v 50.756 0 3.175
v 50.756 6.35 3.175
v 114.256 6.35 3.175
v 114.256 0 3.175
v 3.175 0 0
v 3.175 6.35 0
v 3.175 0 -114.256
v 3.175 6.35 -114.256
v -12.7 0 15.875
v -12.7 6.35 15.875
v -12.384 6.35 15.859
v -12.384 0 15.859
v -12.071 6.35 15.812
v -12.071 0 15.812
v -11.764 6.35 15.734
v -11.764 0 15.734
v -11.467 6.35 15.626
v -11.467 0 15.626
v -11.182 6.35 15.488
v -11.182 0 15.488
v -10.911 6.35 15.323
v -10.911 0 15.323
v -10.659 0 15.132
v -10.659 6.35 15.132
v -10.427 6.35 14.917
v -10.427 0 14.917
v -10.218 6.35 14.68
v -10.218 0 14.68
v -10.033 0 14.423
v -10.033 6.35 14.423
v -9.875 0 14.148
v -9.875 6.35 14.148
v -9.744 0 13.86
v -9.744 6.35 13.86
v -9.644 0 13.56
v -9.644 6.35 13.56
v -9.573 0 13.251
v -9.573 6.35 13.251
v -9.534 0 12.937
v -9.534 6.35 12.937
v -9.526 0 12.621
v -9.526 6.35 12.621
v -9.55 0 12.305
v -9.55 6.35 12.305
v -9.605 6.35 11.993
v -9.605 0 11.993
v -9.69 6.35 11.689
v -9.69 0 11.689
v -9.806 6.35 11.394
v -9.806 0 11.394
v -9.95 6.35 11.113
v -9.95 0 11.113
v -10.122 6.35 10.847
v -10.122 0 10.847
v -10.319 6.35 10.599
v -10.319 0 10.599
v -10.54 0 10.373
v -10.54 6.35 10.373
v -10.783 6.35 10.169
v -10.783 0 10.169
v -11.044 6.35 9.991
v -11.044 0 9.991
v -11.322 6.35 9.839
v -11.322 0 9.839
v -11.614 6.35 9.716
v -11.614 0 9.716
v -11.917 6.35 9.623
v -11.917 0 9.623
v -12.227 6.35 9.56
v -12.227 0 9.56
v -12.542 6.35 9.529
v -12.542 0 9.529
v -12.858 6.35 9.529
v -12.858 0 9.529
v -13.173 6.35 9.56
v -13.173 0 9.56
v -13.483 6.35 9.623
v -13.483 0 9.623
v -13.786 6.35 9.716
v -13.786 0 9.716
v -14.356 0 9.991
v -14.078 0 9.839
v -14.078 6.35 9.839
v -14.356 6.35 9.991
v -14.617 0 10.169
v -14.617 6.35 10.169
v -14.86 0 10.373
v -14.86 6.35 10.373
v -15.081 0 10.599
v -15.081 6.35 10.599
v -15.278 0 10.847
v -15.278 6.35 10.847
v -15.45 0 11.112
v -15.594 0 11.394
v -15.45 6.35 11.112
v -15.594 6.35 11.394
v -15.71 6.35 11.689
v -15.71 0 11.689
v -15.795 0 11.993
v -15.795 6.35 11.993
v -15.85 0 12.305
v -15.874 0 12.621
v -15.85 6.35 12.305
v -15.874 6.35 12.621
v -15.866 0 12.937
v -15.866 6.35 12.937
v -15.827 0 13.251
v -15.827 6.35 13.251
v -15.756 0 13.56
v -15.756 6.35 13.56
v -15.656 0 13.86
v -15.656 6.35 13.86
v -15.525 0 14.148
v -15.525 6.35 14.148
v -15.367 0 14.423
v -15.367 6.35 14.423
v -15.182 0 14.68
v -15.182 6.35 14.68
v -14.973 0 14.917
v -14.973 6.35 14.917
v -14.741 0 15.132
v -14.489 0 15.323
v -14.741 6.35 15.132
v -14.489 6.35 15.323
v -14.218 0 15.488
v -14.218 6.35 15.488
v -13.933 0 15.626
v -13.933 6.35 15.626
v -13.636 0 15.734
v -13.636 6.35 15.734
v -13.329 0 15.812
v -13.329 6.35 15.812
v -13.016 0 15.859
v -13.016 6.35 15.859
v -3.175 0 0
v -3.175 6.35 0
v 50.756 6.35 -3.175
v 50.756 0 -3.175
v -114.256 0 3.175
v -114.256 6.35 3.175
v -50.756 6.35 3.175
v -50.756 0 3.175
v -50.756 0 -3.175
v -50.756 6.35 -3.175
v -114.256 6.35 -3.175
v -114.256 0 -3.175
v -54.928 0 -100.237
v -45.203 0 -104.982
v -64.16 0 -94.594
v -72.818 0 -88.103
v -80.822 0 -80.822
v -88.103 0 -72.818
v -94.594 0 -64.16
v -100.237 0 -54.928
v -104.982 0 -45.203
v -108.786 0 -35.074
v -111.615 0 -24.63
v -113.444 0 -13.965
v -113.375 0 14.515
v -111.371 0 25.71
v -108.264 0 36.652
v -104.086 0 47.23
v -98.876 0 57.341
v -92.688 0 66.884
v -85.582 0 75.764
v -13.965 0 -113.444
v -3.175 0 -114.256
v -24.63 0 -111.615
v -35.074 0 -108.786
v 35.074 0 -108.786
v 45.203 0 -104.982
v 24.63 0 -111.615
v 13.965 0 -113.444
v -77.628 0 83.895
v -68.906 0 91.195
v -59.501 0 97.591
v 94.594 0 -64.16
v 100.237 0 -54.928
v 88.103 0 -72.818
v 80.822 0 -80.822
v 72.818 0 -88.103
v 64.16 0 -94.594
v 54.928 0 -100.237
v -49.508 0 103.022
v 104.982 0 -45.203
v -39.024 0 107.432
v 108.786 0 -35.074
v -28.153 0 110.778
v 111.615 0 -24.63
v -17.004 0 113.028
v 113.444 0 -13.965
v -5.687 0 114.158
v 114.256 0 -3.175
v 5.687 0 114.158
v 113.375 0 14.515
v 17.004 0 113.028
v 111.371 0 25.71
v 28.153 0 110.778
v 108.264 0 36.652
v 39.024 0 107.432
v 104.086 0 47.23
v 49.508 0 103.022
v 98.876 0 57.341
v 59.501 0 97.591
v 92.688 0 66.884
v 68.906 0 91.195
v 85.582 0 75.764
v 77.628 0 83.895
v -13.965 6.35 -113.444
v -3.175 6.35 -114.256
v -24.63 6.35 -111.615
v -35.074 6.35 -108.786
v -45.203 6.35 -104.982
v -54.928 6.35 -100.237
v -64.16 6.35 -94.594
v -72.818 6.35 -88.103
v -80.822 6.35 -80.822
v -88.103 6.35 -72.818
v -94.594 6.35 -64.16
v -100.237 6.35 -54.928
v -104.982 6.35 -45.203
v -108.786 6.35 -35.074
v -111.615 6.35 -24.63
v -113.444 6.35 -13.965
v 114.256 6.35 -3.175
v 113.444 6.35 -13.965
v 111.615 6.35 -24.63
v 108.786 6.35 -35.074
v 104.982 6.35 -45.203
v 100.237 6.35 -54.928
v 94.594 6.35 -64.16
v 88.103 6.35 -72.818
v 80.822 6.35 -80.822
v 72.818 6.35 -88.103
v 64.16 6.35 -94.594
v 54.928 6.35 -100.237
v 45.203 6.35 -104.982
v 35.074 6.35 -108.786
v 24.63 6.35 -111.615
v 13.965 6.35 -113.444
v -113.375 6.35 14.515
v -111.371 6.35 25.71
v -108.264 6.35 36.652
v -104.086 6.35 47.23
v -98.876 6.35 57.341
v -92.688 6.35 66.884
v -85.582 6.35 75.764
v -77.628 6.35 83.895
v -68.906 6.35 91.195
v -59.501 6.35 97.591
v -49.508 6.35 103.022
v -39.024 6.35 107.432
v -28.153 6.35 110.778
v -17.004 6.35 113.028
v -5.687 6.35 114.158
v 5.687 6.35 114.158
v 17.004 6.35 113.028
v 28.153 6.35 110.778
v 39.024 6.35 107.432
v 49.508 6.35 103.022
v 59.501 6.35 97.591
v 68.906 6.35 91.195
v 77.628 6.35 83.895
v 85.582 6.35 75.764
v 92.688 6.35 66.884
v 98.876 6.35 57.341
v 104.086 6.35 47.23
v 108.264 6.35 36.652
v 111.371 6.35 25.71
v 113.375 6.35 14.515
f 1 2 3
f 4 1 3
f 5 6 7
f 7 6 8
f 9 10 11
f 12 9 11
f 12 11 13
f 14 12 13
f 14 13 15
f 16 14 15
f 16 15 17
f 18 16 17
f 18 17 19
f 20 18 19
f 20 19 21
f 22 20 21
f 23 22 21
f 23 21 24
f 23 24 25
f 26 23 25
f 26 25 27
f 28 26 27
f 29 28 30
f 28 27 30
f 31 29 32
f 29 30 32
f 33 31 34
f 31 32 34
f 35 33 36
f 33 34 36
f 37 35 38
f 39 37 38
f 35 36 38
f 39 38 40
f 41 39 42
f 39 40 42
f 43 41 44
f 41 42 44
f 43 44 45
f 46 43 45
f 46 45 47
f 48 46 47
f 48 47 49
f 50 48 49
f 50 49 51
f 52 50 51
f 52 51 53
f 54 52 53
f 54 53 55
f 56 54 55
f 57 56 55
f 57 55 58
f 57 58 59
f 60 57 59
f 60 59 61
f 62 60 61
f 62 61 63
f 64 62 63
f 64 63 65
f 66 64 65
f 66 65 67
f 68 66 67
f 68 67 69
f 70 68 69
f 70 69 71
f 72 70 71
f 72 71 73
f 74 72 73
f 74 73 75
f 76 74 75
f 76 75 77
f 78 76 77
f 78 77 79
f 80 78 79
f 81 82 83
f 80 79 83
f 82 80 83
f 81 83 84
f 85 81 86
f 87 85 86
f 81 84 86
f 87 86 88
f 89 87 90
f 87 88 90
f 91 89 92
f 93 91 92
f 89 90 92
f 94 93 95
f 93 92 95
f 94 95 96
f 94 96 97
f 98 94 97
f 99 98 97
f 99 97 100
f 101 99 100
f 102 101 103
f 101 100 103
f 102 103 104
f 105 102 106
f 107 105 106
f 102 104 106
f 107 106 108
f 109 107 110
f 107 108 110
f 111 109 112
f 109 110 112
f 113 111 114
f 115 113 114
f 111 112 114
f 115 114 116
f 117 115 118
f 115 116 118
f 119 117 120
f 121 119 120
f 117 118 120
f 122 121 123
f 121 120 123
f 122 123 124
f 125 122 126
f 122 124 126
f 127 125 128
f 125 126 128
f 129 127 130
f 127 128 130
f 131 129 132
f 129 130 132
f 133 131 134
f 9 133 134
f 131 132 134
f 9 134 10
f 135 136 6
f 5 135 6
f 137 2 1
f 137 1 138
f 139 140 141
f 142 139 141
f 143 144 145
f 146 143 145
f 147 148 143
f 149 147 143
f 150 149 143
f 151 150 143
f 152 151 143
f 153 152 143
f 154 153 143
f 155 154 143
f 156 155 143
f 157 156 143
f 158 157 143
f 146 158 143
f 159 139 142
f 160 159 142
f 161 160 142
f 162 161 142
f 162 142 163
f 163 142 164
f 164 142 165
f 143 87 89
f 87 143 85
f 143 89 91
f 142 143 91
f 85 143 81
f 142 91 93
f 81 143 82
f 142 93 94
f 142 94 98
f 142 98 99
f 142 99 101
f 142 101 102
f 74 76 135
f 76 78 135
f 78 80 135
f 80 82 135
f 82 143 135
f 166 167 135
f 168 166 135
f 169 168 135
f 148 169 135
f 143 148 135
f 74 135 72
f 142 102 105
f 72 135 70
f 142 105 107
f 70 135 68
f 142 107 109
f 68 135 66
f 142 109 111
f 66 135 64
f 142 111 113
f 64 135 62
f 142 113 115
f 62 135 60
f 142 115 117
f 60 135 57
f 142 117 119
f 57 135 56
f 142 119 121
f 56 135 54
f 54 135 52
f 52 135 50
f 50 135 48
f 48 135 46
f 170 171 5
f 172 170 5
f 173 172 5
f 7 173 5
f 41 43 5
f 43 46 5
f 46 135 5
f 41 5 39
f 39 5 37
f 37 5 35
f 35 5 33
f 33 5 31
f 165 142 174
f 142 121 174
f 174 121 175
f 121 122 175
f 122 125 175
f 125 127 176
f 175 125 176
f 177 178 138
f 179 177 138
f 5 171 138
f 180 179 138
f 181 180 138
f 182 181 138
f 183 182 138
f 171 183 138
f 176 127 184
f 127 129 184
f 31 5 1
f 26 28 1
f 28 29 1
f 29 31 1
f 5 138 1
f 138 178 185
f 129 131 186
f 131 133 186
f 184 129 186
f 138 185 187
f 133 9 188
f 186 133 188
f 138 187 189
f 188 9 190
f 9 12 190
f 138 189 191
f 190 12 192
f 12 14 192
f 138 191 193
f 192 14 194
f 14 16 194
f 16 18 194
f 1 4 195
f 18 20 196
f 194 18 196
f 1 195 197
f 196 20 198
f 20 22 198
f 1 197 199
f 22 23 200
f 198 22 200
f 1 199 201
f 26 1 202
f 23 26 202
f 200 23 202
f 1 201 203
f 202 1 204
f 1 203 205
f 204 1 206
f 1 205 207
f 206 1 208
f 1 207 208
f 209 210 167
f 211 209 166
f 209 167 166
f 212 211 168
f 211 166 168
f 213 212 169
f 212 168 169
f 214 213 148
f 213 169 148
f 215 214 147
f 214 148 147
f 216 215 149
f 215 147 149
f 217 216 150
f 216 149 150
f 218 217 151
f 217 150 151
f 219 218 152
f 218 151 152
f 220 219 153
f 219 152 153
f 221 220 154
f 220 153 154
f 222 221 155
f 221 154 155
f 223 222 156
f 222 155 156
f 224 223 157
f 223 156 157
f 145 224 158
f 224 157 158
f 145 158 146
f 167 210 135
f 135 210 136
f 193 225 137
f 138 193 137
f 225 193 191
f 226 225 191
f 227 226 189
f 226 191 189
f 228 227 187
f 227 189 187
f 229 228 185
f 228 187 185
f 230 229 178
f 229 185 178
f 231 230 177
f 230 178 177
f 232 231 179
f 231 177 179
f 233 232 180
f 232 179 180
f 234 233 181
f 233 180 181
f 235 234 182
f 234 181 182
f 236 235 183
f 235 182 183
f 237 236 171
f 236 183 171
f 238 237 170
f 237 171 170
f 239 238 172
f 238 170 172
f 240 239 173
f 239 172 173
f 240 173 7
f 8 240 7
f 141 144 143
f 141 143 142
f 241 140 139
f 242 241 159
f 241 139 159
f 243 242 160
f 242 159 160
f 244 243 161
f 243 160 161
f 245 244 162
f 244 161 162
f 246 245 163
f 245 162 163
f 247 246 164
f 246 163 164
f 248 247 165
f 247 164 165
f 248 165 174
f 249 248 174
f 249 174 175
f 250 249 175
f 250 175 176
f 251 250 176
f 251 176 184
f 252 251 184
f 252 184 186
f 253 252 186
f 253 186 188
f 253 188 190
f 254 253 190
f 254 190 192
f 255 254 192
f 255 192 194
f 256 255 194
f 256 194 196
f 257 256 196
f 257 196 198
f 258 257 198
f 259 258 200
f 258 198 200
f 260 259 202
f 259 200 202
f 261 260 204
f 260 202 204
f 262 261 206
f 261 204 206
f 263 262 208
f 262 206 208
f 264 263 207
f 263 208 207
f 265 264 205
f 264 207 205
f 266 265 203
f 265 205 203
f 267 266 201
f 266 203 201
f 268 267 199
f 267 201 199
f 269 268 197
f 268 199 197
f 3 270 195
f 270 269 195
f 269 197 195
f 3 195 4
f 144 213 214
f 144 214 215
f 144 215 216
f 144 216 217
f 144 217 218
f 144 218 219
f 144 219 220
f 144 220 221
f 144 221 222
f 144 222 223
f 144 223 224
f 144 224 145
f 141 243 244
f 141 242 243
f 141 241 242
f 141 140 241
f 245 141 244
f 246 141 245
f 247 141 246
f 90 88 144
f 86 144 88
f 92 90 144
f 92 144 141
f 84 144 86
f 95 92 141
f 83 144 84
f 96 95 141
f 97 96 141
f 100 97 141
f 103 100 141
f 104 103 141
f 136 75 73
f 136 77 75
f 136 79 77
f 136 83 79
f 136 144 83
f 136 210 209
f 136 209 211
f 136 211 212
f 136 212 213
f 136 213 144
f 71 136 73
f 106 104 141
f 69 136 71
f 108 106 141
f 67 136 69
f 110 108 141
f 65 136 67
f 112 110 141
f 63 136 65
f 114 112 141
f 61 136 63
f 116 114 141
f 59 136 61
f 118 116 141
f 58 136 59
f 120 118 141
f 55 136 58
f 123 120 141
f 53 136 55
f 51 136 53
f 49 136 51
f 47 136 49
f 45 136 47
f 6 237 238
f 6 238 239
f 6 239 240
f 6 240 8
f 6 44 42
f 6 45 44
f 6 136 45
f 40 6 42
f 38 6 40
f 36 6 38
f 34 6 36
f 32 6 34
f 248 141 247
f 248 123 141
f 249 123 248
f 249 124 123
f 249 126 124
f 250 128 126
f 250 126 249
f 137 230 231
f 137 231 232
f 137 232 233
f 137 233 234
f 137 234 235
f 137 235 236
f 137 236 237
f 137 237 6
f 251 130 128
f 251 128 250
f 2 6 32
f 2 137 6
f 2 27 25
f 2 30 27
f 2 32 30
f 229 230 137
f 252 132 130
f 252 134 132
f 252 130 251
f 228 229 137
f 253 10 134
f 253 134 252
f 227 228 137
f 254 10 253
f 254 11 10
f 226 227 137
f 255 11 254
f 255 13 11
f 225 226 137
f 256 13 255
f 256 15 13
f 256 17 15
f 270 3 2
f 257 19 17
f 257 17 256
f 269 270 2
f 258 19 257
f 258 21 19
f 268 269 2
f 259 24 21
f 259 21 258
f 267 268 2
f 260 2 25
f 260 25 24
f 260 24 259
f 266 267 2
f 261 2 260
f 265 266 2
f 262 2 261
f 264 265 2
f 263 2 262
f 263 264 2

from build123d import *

# Parameters (mm, degrees)
SKETCH1_R           = 114.3
BOSS_EXTRUDE1_DEPTH = 6.35
CUT_EXTRUDE2_DEPTH  = 162.769287876
CUT_EXTRUDE3_DEPTH  = 162.769287876
CUT_EXTRUDE5_DEPTH  = 162.738127462
SKETCH6_R           = 3.175
CUT_EXTRUDE6_DEPTH  = 162.738127462


with BuildPart() as part:
    # Sketch1 → Boss-Extrude1 (new body)
    with BuildSketch(Plane(origin=(0, 0, 0), x_dir=(1, 0, 0), z_dir=(0, 1, 0))):
        Circle(SKETCH1_R)
    extrude(amount=BOSS_EXTRUDE1_DEPTH)

    # Sketch3 → Cut-Extrude2 (cut, through all)
    with BuildSketch(Plane(origin=(0, 6.35, 0), x_dir=(1, 0, 0), z_dir=(0, 1, 0))):
        Polygon((114.255894268, 3.175), (120.605894268, 3.175), (120.605894268, -3.175), (114.255894268, -3.175), (50.755894268, -3.175), (50.755894268, 3.175), align=None)
    extrude(amount=-CUT_EXTRUDE2_DEPTH, mode=Mode.SUBTRACT)

    # Sketch4 → Cut-Extrude3 (cut, through all)
    with BuildSketch(Plane(origin=(0, 6.35, 0), x_dir=(1, 0, 0), z_dir=(0, 1, 0))):
        Polygon((-50.755894268, -3.175), (-114.255894268, -3.175), (-120.605894268, -3.175), (-120.605894268, 3.175), (-114.255894268, 3.175), (-50.755894268, 3.175), align=None)
    extrude(amount=-CUT_EXTRUDE3_DEPTH, mode=Mode.SUBTRACT)

    # Sketch5 → Cut-Extrude5 (cut, through all)
    with BuildSketch(Plane(origin=(0, 6.35, 0), x_dir=(1, 0, 0), z_dir=(0, 1, 0))):
        Polygon((-3.175, 0), (3.175, 0), (3.175, 114.255894268), (3.175, 116.129613815), (-3.175, 116.129613815), (-3.175, 114.255894268), align=None)
    extrude(amount=-CUT_EXTRUDE5_DEPTH, mode=Mode.SUBTRACT)

    # Sketch6 → Cut-Extrude6 (cut, through all)
    with BuildSketch(Plane(origin=(0, 6.35, 0), x_dir=(1, 0, 0), z_dir=(0, 1, 0))):
        with Locations((-12.7, -12.7)):
            Circle(SKETCH6_R)
    extrude(amount=-CUT_EXTRUDE6_DEPTH, mode=Mode.SUBTRACT)


solid = part.part
